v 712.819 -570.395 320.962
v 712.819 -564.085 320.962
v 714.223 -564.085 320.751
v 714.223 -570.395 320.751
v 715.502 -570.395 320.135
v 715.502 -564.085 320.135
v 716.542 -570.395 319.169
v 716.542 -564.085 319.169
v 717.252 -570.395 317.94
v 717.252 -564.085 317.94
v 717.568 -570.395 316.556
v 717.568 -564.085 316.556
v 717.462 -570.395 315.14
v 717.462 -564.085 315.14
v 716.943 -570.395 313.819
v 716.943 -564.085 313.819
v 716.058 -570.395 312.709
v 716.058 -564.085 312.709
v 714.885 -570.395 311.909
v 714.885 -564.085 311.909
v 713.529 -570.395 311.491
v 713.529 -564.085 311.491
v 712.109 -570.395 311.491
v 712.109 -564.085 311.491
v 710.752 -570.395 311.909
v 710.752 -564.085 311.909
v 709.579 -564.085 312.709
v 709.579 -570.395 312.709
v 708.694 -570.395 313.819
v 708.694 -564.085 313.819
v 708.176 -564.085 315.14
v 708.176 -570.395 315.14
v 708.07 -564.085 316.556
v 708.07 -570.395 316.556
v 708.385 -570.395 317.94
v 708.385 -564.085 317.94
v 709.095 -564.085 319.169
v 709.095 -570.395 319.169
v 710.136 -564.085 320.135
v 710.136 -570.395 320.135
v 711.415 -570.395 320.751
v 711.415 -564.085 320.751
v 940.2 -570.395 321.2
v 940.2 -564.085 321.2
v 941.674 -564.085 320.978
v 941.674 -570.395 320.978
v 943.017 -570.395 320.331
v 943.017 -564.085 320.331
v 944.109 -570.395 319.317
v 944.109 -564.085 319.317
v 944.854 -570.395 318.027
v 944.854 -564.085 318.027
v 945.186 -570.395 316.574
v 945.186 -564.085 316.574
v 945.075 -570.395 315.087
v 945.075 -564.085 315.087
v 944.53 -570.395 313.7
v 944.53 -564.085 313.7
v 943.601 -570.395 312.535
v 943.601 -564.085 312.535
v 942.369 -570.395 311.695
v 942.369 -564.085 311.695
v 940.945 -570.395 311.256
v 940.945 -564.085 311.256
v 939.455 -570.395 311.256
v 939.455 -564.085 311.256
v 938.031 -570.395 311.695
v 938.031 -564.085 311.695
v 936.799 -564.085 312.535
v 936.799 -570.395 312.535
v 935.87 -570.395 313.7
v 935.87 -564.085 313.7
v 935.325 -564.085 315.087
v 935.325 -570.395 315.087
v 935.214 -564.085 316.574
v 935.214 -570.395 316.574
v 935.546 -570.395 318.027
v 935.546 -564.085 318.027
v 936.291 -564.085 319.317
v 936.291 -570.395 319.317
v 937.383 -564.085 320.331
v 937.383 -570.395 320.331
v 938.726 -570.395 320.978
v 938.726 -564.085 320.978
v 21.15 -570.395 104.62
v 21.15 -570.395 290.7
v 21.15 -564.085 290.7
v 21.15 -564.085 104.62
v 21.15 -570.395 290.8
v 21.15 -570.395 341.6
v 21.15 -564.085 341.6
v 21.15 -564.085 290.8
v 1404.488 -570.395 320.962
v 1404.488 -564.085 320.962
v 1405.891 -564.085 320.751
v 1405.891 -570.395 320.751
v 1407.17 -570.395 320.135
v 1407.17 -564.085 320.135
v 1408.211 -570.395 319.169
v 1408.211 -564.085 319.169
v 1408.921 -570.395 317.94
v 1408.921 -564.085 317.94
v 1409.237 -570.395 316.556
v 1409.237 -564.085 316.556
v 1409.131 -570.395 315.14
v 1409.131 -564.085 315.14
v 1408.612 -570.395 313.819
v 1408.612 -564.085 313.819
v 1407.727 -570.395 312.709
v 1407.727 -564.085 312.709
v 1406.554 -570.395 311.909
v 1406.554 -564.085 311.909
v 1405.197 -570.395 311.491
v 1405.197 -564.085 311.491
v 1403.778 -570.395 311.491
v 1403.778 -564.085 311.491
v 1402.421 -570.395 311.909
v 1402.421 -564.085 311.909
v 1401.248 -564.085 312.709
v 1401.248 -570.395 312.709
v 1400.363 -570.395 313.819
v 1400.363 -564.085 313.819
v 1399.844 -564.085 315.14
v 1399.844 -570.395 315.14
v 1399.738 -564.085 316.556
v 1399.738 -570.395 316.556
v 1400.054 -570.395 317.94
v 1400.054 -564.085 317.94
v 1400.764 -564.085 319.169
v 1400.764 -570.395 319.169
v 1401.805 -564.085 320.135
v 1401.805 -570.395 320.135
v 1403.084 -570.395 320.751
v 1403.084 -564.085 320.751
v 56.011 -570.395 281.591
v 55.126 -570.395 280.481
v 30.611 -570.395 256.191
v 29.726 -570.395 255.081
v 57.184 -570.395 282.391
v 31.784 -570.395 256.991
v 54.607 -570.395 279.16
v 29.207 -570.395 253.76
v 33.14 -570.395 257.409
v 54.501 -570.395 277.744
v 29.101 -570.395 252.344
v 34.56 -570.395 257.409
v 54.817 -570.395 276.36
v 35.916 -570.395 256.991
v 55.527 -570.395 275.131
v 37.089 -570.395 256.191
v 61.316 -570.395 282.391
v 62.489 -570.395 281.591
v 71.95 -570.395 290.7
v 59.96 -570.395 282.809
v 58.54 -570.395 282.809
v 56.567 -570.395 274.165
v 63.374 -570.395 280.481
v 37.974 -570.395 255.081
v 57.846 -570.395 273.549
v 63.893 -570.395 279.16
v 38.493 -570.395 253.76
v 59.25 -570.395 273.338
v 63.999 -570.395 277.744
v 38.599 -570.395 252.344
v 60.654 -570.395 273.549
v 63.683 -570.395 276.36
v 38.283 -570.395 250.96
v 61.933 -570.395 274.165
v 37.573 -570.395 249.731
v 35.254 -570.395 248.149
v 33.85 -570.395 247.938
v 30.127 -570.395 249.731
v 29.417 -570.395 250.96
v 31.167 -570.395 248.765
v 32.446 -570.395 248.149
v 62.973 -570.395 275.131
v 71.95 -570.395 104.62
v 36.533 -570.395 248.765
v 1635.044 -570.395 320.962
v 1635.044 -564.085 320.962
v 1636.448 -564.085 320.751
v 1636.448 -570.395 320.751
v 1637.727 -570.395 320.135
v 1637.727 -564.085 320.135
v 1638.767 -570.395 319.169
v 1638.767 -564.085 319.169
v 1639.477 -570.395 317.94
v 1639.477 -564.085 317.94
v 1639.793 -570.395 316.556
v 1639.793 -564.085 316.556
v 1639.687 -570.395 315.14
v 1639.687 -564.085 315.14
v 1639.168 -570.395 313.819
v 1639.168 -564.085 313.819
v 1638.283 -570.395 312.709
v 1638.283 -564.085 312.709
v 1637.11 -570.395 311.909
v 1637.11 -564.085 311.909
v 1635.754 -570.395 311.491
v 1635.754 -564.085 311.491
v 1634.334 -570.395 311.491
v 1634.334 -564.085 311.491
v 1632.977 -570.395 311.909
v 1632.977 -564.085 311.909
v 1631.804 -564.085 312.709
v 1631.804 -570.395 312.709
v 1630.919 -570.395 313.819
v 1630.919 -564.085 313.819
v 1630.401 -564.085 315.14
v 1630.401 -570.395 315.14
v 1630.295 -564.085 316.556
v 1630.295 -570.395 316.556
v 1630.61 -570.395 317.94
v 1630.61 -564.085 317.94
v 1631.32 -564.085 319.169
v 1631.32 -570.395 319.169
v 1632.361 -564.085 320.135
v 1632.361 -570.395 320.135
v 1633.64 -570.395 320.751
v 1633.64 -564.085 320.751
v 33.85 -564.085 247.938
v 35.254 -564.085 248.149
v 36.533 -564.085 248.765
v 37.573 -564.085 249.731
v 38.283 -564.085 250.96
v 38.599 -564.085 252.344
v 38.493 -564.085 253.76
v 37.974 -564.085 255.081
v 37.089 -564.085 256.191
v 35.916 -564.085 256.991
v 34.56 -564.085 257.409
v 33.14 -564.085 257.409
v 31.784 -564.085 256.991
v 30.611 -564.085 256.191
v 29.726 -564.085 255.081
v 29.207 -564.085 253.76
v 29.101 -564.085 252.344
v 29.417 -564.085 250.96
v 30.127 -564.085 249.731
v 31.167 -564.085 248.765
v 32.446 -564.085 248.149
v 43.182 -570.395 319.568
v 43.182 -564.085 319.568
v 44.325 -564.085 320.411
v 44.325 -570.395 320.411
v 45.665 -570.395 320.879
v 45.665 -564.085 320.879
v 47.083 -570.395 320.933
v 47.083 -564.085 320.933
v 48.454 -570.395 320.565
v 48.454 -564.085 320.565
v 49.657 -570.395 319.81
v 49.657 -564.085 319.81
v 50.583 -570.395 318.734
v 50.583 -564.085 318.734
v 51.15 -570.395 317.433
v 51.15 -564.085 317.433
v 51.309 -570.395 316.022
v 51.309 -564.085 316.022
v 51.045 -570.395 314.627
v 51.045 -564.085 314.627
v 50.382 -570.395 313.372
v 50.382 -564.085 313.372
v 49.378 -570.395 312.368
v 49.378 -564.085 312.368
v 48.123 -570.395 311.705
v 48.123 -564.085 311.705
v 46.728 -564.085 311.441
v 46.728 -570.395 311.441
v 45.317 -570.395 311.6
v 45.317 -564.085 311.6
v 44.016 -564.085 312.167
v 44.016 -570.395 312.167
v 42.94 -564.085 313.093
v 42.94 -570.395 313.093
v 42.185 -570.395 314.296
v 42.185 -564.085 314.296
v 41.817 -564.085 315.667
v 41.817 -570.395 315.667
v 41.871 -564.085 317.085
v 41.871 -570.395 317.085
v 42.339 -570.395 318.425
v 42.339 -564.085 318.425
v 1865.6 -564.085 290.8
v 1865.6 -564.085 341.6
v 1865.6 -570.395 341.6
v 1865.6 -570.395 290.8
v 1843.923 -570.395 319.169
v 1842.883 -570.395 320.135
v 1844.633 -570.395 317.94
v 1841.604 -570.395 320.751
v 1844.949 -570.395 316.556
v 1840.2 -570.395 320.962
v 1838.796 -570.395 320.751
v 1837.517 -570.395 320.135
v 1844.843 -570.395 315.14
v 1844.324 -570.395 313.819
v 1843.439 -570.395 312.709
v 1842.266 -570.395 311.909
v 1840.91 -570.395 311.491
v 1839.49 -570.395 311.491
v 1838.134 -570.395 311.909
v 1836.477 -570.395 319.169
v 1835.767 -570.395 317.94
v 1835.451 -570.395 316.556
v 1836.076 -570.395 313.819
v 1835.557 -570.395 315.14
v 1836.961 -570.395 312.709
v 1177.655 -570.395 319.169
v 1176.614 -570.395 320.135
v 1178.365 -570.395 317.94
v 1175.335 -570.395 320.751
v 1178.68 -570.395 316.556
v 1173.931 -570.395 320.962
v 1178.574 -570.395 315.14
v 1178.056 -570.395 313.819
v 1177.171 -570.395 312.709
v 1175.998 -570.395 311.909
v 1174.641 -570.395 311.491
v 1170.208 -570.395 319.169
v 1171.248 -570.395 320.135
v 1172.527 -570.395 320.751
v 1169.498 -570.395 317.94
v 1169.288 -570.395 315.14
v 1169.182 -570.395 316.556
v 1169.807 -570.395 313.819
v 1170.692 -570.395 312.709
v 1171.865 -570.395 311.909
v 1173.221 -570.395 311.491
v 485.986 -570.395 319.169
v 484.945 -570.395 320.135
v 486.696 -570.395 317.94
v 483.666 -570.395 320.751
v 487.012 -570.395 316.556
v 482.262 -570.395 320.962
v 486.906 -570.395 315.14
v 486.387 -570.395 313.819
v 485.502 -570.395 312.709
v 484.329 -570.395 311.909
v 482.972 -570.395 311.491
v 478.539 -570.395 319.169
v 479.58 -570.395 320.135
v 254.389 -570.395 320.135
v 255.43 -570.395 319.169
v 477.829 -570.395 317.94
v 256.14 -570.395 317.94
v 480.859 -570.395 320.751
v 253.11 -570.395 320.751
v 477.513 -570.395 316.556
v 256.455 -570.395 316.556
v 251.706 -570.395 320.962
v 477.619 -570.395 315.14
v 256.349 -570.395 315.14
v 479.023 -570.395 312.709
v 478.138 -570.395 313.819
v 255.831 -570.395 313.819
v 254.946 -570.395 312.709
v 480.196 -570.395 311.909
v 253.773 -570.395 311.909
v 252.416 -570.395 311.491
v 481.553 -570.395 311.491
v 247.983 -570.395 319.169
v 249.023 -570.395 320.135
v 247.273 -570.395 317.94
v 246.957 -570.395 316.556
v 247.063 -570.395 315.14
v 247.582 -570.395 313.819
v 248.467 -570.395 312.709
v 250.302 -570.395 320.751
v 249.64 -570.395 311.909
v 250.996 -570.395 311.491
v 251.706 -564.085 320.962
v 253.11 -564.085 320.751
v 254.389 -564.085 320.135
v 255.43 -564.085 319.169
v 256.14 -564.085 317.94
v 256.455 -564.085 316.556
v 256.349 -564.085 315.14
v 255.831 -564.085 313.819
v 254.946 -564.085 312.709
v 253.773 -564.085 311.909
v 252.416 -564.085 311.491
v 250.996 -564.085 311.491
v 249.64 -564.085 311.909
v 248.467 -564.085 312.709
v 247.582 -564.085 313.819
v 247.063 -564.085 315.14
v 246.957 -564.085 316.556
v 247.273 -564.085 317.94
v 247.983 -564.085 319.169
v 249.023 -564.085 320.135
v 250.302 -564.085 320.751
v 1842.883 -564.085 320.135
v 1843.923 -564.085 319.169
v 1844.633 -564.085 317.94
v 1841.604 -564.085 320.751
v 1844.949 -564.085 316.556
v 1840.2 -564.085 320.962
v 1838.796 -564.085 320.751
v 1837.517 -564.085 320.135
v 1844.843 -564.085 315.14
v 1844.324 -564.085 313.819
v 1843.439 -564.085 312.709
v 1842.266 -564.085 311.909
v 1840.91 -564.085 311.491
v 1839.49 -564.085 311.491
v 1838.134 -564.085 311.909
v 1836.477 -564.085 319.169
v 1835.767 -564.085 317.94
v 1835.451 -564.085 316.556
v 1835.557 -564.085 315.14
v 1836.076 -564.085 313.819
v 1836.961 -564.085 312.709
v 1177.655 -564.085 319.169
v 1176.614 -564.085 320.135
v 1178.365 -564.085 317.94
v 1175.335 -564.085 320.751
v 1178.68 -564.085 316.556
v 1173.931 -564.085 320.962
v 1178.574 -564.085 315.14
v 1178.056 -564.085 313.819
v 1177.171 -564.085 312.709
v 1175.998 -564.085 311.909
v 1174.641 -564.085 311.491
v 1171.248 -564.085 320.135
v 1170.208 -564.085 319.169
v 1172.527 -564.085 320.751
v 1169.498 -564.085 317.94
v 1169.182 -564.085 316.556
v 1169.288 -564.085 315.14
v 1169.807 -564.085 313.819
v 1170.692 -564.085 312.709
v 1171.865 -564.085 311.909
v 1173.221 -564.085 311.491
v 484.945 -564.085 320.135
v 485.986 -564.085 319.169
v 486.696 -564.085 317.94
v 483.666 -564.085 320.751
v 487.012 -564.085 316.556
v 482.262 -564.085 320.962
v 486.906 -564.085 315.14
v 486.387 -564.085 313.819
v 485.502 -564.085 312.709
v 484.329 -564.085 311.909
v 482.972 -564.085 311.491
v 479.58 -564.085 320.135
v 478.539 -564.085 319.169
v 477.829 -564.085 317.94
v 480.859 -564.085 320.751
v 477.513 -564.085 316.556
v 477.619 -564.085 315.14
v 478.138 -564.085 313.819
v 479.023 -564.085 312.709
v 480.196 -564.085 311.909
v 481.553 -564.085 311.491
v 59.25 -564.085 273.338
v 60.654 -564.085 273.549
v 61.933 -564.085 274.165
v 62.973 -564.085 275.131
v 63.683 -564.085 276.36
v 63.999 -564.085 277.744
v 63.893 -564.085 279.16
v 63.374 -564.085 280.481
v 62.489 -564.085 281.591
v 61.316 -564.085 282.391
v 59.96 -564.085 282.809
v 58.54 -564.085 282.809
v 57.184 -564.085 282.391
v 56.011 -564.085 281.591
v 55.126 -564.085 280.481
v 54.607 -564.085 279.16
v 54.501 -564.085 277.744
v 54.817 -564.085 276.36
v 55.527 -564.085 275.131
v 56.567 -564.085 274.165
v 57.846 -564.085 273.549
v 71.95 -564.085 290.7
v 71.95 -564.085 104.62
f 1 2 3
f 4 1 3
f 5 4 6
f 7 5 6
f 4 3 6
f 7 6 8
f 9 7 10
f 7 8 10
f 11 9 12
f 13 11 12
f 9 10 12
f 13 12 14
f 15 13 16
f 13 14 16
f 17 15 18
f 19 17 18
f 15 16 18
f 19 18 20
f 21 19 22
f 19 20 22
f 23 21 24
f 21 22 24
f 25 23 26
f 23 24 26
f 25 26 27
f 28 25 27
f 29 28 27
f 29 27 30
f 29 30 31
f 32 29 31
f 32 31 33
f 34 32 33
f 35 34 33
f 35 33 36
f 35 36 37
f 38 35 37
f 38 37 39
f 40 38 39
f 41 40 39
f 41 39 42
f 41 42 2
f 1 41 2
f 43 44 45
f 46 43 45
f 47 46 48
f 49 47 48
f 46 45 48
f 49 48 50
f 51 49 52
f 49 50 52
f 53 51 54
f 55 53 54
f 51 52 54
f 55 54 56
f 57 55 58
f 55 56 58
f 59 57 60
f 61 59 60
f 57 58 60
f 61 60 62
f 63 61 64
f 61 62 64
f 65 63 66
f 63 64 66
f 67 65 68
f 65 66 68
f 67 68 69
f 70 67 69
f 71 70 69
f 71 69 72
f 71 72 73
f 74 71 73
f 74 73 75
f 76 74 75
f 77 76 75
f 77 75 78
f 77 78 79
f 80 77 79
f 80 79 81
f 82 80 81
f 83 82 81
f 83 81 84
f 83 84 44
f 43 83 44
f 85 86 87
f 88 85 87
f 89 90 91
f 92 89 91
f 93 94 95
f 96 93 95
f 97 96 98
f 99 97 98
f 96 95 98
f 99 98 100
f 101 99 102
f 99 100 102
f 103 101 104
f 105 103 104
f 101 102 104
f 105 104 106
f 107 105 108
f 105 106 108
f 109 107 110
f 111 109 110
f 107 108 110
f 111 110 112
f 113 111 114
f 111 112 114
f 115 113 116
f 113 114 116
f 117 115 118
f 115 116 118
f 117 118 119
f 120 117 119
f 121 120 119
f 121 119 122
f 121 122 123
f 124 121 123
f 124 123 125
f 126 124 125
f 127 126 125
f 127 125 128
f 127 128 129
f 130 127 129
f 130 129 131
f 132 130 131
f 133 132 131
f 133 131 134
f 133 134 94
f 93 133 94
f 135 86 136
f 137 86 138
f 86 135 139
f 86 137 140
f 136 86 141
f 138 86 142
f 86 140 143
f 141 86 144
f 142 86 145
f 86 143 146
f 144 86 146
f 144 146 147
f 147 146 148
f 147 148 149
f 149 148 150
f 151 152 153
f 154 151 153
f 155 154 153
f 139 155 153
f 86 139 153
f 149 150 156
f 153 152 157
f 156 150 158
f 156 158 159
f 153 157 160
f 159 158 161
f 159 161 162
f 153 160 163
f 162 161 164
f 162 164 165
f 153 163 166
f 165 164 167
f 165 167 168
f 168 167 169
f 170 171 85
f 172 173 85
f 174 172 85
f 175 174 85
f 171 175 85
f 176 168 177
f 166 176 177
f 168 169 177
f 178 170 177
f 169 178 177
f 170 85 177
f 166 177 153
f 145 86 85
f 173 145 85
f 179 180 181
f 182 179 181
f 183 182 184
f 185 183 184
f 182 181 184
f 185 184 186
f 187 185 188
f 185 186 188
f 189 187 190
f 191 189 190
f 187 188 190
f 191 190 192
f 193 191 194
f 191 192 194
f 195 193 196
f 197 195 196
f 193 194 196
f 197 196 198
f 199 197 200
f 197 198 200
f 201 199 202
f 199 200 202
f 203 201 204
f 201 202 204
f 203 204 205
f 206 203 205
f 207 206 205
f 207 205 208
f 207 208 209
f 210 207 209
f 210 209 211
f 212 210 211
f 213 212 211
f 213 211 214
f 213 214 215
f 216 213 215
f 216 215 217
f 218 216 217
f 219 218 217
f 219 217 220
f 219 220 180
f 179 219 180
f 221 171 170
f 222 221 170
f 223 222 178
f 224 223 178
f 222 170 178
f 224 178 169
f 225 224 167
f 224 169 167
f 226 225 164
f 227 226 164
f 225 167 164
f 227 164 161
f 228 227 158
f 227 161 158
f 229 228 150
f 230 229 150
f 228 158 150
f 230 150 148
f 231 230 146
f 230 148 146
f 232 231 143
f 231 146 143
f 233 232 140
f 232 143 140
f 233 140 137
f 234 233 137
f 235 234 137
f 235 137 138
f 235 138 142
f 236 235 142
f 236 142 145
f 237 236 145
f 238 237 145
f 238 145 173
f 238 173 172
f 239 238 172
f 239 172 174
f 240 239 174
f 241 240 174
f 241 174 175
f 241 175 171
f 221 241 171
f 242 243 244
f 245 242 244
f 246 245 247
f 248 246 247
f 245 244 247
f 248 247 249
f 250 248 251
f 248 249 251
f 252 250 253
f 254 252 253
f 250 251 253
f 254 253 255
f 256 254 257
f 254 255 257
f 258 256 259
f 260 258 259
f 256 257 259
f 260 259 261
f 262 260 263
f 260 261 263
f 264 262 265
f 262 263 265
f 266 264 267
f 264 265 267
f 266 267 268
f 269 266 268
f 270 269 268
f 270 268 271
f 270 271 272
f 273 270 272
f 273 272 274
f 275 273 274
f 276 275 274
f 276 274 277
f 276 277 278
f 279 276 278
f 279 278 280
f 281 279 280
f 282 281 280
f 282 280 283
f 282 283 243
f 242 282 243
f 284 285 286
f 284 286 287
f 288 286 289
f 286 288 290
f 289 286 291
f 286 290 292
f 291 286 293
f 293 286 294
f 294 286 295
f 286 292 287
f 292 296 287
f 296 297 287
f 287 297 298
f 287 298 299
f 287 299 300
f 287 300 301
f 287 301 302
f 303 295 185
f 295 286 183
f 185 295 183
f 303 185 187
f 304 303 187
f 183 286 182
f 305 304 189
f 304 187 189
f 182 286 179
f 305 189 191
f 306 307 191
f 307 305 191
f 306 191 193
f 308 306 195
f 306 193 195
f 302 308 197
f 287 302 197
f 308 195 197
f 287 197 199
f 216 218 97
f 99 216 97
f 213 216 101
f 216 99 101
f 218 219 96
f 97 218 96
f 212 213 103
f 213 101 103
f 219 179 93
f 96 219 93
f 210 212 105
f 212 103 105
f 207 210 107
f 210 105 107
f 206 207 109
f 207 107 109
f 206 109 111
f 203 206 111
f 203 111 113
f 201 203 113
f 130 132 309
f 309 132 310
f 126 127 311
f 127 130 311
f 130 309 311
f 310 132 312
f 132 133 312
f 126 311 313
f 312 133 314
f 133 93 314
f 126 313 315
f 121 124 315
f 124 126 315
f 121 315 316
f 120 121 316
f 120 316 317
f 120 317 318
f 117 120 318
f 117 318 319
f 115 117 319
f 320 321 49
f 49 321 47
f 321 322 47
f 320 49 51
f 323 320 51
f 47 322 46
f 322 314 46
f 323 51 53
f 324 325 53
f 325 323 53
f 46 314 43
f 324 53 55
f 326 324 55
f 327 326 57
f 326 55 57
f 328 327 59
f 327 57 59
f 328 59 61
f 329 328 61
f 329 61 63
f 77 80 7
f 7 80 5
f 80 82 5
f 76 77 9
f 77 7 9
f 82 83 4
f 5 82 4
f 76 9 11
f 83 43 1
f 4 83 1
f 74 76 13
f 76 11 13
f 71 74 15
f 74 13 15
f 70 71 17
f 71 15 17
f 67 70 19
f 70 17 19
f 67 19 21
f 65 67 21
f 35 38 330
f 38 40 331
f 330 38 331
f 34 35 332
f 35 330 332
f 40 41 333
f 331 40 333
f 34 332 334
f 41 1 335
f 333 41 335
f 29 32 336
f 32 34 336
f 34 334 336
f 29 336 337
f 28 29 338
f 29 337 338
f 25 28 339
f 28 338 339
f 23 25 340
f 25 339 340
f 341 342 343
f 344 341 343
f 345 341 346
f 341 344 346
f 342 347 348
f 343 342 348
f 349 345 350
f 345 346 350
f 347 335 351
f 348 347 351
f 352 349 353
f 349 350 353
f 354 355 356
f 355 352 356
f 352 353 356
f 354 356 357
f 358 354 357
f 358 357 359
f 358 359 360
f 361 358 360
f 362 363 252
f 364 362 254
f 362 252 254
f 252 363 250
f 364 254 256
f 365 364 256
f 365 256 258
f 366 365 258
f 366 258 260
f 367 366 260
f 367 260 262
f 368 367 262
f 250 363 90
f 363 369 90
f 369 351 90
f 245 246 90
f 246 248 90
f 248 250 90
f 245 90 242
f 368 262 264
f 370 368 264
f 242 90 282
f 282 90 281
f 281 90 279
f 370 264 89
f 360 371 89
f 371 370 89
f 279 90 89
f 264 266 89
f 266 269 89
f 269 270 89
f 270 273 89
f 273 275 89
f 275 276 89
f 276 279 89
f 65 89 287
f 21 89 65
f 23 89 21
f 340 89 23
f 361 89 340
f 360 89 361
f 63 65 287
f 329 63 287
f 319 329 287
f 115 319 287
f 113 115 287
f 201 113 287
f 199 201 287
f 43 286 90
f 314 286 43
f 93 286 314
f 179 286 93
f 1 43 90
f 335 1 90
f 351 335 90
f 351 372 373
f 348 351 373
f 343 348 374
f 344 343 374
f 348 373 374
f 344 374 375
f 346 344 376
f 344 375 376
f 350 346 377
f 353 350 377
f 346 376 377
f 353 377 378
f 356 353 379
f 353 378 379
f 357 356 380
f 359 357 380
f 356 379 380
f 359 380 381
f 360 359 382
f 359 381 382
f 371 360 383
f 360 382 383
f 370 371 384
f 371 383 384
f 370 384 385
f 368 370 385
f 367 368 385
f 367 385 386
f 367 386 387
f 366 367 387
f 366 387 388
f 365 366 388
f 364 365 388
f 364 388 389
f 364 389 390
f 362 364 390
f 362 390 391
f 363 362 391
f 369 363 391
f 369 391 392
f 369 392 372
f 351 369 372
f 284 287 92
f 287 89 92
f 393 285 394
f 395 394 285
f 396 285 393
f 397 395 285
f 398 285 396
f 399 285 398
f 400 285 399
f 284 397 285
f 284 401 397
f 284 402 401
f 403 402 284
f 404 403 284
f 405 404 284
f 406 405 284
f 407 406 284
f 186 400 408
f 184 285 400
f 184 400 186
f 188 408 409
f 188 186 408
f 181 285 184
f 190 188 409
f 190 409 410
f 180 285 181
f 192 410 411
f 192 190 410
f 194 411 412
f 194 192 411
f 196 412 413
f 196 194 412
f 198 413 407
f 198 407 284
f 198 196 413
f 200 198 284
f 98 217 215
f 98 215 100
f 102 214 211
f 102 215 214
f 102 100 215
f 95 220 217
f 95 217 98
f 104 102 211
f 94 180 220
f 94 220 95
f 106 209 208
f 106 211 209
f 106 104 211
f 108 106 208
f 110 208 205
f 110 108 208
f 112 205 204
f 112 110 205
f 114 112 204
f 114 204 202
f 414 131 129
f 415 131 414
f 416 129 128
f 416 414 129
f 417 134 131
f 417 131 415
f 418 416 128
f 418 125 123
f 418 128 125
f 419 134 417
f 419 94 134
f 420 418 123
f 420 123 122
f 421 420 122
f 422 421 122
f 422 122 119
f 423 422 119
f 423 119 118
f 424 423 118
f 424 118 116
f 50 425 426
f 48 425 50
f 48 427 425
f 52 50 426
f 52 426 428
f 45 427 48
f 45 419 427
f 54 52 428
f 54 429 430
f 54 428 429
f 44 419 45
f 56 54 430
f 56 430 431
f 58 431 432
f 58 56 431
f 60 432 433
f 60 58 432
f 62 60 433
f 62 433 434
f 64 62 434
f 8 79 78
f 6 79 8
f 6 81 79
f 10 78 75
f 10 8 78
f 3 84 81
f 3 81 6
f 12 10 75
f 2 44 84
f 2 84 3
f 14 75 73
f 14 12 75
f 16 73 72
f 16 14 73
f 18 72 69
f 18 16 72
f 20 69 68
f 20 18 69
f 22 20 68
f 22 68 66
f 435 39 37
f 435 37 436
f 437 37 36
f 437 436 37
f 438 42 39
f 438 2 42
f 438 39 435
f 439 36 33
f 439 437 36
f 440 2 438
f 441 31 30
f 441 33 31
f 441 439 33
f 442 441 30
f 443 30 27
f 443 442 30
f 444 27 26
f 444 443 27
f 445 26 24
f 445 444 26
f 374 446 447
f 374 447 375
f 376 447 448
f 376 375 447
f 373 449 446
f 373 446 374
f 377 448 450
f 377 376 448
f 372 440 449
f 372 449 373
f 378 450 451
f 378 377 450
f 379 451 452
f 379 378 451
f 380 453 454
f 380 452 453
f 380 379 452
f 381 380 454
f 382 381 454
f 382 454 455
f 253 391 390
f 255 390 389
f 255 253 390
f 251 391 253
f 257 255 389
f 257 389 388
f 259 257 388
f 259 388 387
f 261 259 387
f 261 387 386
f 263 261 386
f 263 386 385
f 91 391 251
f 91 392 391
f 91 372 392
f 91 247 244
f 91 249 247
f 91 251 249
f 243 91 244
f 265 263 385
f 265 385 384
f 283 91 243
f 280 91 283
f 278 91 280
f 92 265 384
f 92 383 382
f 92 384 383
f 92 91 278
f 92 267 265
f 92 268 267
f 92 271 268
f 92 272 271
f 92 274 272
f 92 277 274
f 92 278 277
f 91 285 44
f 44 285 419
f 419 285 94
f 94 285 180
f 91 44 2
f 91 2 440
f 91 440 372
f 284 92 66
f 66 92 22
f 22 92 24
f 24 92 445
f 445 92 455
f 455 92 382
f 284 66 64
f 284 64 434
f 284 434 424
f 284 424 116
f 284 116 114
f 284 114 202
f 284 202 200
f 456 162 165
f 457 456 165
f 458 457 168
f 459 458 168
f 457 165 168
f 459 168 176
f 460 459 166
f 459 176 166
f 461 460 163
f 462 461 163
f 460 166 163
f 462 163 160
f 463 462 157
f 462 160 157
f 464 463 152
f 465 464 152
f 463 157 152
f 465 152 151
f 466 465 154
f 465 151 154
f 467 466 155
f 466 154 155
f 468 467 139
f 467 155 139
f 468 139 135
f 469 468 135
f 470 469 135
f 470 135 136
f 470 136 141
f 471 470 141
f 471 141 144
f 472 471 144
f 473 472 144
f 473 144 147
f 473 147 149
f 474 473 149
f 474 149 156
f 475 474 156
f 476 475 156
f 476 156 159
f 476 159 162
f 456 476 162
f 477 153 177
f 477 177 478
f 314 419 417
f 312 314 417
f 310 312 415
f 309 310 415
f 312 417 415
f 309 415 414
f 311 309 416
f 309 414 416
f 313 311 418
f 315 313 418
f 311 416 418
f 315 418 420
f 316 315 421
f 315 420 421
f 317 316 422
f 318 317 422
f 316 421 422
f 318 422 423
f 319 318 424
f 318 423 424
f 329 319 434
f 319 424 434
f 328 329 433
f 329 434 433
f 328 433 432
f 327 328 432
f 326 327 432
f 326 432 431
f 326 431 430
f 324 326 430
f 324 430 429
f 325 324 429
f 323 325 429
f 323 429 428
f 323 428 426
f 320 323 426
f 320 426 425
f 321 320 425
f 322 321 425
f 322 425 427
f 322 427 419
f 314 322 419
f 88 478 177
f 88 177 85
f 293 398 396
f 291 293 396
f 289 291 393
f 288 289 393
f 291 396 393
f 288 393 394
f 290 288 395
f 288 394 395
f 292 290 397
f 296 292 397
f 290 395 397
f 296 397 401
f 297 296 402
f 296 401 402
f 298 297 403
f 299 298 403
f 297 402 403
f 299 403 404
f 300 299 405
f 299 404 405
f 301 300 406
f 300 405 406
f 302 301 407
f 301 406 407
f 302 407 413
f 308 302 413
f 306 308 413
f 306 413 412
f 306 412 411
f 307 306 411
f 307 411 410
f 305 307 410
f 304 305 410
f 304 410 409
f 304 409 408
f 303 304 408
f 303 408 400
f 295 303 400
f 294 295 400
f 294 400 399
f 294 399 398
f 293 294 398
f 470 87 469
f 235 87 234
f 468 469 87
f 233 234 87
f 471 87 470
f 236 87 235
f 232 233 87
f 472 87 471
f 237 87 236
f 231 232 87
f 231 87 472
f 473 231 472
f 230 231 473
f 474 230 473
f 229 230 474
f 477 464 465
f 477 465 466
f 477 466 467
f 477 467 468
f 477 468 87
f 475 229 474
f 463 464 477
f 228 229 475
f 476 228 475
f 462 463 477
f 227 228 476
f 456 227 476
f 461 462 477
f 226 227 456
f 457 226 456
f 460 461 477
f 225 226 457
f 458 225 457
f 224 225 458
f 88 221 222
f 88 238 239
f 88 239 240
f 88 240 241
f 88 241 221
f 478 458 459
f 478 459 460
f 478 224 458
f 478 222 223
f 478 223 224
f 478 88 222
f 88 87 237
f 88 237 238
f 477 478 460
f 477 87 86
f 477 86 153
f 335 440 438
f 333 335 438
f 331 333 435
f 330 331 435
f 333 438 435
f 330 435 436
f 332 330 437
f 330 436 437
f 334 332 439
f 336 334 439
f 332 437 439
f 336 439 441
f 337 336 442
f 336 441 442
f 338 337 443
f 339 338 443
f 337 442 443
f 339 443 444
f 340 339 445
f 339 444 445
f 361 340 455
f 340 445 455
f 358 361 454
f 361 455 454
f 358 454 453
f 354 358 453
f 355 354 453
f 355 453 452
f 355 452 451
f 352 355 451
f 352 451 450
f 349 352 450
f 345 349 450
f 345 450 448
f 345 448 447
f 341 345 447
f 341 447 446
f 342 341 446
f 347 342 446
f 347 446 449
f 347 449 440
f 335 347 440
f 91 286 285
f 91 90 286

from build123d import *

# Parameters (mm, degrees)
CROQUIS2_W               = 50.8
CROQUIS2_H               = 6.31
CROQUIS3_W               = 50.8
CROQUIS3_H               = 6.31
CROQUIS4_W               = 60
CROQUIS4_H               = 53.155
SALIENTE_EXTRUIR1_DEPTH  = 6.31
CROQUIS5_W               = 60
CROQUIS5_H               = 6.31
CORTAR_EXTRUIR1_DEPTH    = 6.31
CORTAR_EXTRUIR2_DEPTH    = 502
CROQUIS8_W               = 50.8
CROQUIS8_H               = 564.085
CORTAR_EXTRUIR3_DEPTH    = 502
CROQUIS9_W               = 314.3
CROQUIS9_H               = 1090.402933
CORTAR_EXTRUIR4_DEPTH    = 502
CROQUIS10_W              = 50.8
CROQUIS10_H              = 6.31
CORTAR_EXTRUIR5_DEPTH    = 95
CORTAR_EXTRUIR6_DEPTH    = 95
CROQUIS13_W              = 120
CROQUIS13_H              = 249.755
CORTAR_EXTRUIR7_DEPTH    = 95
CROQUIS16_W              = 125
CROQUIS16_H              = 50.8
SALIENTE_EXTRUIR4_DEPTH  = 6.31
CROQUIS17_W              = 50.8
CROQUIS17_H              = 6.31
SALIENTE_EXTRUIR5_DEPTH  = 50.8
SALIENTE_EXTRUIR6_DEPTH  = 50.8
CROQUIS21_W              = 10
CROQUIS21_H              = 50.8
CORTAR_EXTRUIR9_DEPTH    = 53
CROQUIS22_W              = 0.1
CROQUIS22_H              = 50.8
CORTAR_EXTRUIR10_DEPTH   = 10
CORTAR_EXTRUIR11_DEPTH   = 237
CROQUIS24_W              = 50.8
CROQUIS24_H              = 204.986160176
CORTAR_EXTRUIR12_DEPTH   = 237
CROQUIS25_W              = 50.8
CROQUIS25_H              = 6.31
SALIENTE_EXTRUIR7_DEPTH  = 1.1
CROQUIS26_W              = 50.8
CROQUIS26_H              = 6.31
SALIENTE_EXTRUIR8_DEPTH  = 12.7
CROQUIS27_R              = 5
CORTAR_EXTRUIR13_DEPTH   = 10
CROQUIS28_W              = 0.1
CROQUIS28_H              = 50.8
SALIENTE_EXTRUIR9_DEPTH  = 6.31
CROQUIS29_W              = 50.8
CROQUIS29_H              = 0.1
CORTAR_EXTRUIR14_DEPTH   = 50
CROQUIS30_W              = 50.8
CROQUIS30_H              = 6.31
SALIENTE_EXTRUIR10_DEPTH = 50.8
CROQUIS31_R              = 4.7625
CORTAR_EXTRUIR15_DEPTH   = 10
CROQUIS32_R              = 4.7625
CORTAR_EXTRUIR16_DEPTH   = 33
CROQUIS33_R              = 4.7625
CORTAR_EXTRUIR17_DEPTH   = 50
CROQUIS34_R              = 4.7625
CORTAR_EXTRUIR18_DEPTH   = 82


with BuildPart() as part:
    # Barrer1: sweep along a curve in space
    with BuildLine() as barrer1_path:
        Line((0, 0, 0), (0, -567.24, 0))
        Line((0, -567.24, 0), (0, -567.24, 316.2))
        Line((0, -567.24, 316.2), (1786.7, -567.24, 316.2))
        Line((1786.7, -567.24, 316.2), (1786.7, -567.24, 578))
        Line((1786.7, -567.24, 578), (1786.7, -435.47278313, 578))
        Line((1786.7, -435.47278313, 578), (1786.7, -435.47278313, 1432.002933))
    # Croquis2 → Barrer1 (sweep)
    with BuildSketch(Plane(origin=(0, 0, 0), x_dir=(1, 0, 0), z_dir=(0, 1, 0))):
        Rectangle(CROQUIS2_W, CROQUIS2_H)
        with Locations((263.5, 0)):
            Rectangle(CROQUIS2_W, CROQUIS2_H)
    sweep(path=barrer1_path.line, transition=Transition.RIGHT)

    # Barrer4: sweep along a curve in space
    with BuildLine() as barrer4_path:
        Line((-0.201028049, -3.155, -3.155), (-0.201028049, -3.155, -207.155))
        Line((-0.201028049, -3.155, -207.155), (-0.201028049, -53.155, -207.155))
    # Croquis3 → Barrer4 (sweep)
    with BuildSketch(Plane(origin=(0, 0, -3.155), x_dir=(-1, 0, 0), z_dir=(0, 0, -1))):
        with Locations((-263.5, -3.155)):
            Rectangle(CROQUIS3_W, CROQUIS3_H)
        with Locations((0, -3.155)):
            Rectangle(CROQUIS3_W, CROQUIS3_H)
    sweep(path=barrer4_path.line, transition=Transition.RIGHT)

    # Croquis4 → Saliente-Extruir1 (add)
    with BuildSketch(Plane(origin=(0, 0, -210.31), x_dir=(-1, 0, 0), z_dir=(0, 0, -1))):
        with Locations((-208.1, -26.5775)):
            Rectangle(CROQUIS4_W, CROQUIS4_H)
    extrude(amount=-SALIENTE_EXTRUIR1_DEPTH)

    # Croquis5 → Cortar-Extruir1 (cut)
    with BuildSketch(Plane.XY.offset(-204)):
        with Locations((208.1, -3.155)):
            Rectangle(CROQUIS5_W, CROQUIS5_H)
    extrude(amount=-CORTAR_EXTRUIR1_DEPTH, mode=Mode.SUBTRACT)

    # Croquis7 → Cortar-Extruir2 (cut)
    with BuildSketch(Plane.XY.offset(3.155)):
        Polygon((288.9, -564.085), (238.1, -564.085), (238.1, -68.875540851), (170.611072112, -68.875540851), (170.611072112, 0), (288.9, 0), align=None)
    extrude(amount=-CORTAR_EXTRUIR2_DEPTH, mode=Mode.SUBTRACT)

    # Croquis8 → Cortar-Extruir3 (cut)
    with BuildSketch(Plane.XY.offset(3.155)):
        with Locations((0, -282.0425)):
            Rectangle(CROQUIS8_W, CROQUIS8_H)
    extrude(amount=-CORTAR_EXTRUIR3_DEPTH, mode=Mode.SUBTRACT)

    # Croquis9 → Cortar-Extruir4 (cut)
    with BuildSketch(Plane(origin=(0, -432.31778313, 0), x_dir=(1, 0, 0), z_dir=(0, 1, 0))):
        with Locations((1918.45, -886.8014665)):
            Rectangle(CROQUIS9_W, CROQUIS9_H)
    extrude(amount=-CORTAR_EXTRUIR4_DEPTH, mode=Mode.SUBTRACT)

    # Croquis10 → Cortar-Extruir5 (cut)
    with BuildSketch(Plane(origin=(0, 0, -3.155), x_dir=(-1, 0, 0), z_dir=(0, 0, -1))):
        with Locations((0, -567.24)):
            Rectangle(CROQUIS10_W, CROQUIS10_H)
    extrude(amount=-CORTAR_EXTRUIR5_DEPTH, mode=Mode.SUBTRACT)

    # Croquis11 → Cortar-Extruir6 (cut)
    with BuildSketch(Plane(origin=(0, -564.085, 0), x_dir=(1, 0, 0), z_dir=(0, 1, 0))):
        Polygon((238.1, -78.1), (288.9, -78.1), (288.9, -27.3), align=None)
        Polygon((238.1, -78.1), (288.9, -27.3), (238.1, -27.3), align=None)
        Polygon((238.1, -27.3), (288.9, -27.3), (288.9, -3.155), (288.9, 3.155), (238.1, 3.155), (238.1, -3.155), align=None)
    extrude(amount=-CORTAR_EXTRUIR6_DEPTH, mode=Mode.SUBTRACT)

    # Croquis13 → Cortar-Extruir7 (cut)
    with BuildSketch(Plane(origin=(0, -564.085, 0), x_dir=(1, 0, 0), z_dir=(0, 1, 0))):
        with Locations((34.6, -216.7225)):
            Rectangle(CROQUIS13_W, CROQUIS13_H)
    extrude(amount=-CORTAR_EXTRUIR7_DEPTH, mode=Mode.SUBTRACT)

    # Croquis16 → Saliente-Extruir4 (add)
    with BuildSketch(Plane(origin=(0, -564.085, 0), x_dir=(1, 0, 0), z_dir=(0, 1, 0))):
        with Locations((226.4, -52.7)):
            Rectangle(CROQUIS16_W, CROQUIS16_H)
    extrude(amount=-SALIENTE_EXTRUIR4_DEPTH)

    # Barrer5: sweep along a curve in space
    with BuildLine() as barrer5_path:
        Line((94.6, -567.24, 316.2), (46.55, -567.24, 316.2))
        Line((46.55, -567.24, 316.2), (46.55, -567.24, 105.72))
    # Croquis17 → Barrer5 (sweep)
    with BuildSketch(Plane.ZY.offset(-94.6)):
        with Locations((316.2, -567.24)):
            Rectangle(CROQUIS17_W, CROQUIS17_H)
    sweep(path=barrer5_path.line, transition=Transition.RIGHT)

    # Croquis20 → Saliente-Extruir6 (add)
    with BuildSketch(Plane.ZY.offset(-163.9)):
        Polygon((78.1, -564.085), (78.1, -439.884522326), (59.966060883, -387.925515276), (54.008468178, -390.004743297), (71.79, -440.954001003), (71.79, -564.085), align=None)
    extrude(amount=-SALIENTE_EXTRUIR6_DEPTH)

    # Croquis21 → Cortar-Extruir9 (cut)
    with BuildSketch(Plane(origin=(0, -564.085, 0), x_dir=(1, 0, 0), z_dir=(0, 1, 0))):
        with Locations((1807.1, -316.2)):
            Rectangle(CROQUIS21_W, CROQUIS21_H)
    extrude(amount=-CORTAR_EXTRUIR9_DEPTH, mode=Mode.SUBTRACT)

    # Croquis22 → Cortar-Extruir10 (cut)
    with BuildSketch(Plane(origin=(0, -564.085, 0), x_dir=(1, 0, 0), z_dir=(0, 1, 0))):
        with Locations((72, -316.2)):
            Rectangle(CROQUIS22_W, CROQUIS22_H)
    extrude(amount=-CORTAR_EXTRUIR10_DEPTH, mode=Mode.SUBTRACT)

    # Croquis23 → Cortar-Extruir11 (cut)
    with BuildSketch(Plane.XZ.offset(570.395)):
        Polygon((2024.8, 341.6), (2024.8, 78.1), (163.9, 78.1), (163.9, 0), (2111.300371304, 0), (2111.300371304, 341.6), align=None)
    extrude(amount=-CORTAR_EXTRUIR11_DEPTH, mode=Mode.SUBTRACT)

    # Croquis25 → Saliente-Extruir7 (add)
    with BuildSketch(Plane(origin=(0, 0, 105.72), x_dir=(-1, 0, 0), z_dir=(0, 0, -1))):
        with Locations((-46.55, -567.24)):
            Rectangle(CROQUIS25_W, CROQUIS25_H)
    extrude(amount=SALIENTE_EXTRUIR7_DEPTH)

    # Croquis26 → Saliente-Extruir8 (add)
    with BuildSketch(Plane(origin=(1802.1, 0, 0), x_dir=(0, 0, -1), z_dir=(1, 0, 0))):
        with Locations((-316.2, -567.24)):
            Rectangle(CROQUIS26_W, CROQUIS26_H)
    extrude(amount=SALIENTE_EXTRUIR8_DEPTH)

    # Croquis27 → Cortar-Extruir13 (cut)
    with BuildSketch(Plane(origin=(0, -564.085, 0), x_dir=(1, 0, 0), z_dir=(0, 1, 0))):
        with Locations(Location((940.200000079, -316.2, 0), (0, 0, 270))):
            Circle(CROQUIS27_R)
    extrude(amount=-CORTAR_EXTRUIR13_DEPTH, mode=Mode.SUBTRACT)

    # Croquis28 → Saliente-Extruir9 (add)
    with BuildSketch(Plane(origin=(0, -564.085, 0), x_dir=(1, 0, 0), z_dir=(0, 1, 0))):
        with Locations((72, -316.2)):
            Rectangle(CROQUIS28_W, CROQUIS28_H)
    extrude(amount=-SALIENTE_EXTRUIR9_DEPTH)

    # Croquis29 → Cortar-Extruir14 (cut)
    with BuildSketch(Plane(origin=(0, -564.085, 0), x_dir=(1, 0, 0), z_dir=(0, 1, 0))):
        with Locations((46.55, -290.75)):
            Rectangle(CROQUIS29_W, CROQUIS29_H)
    extrude(amount=-CORTAR_EXTRUIR14_DEPTH, mode=Mode.SUBTRACT)


with BuildPart() as body_2:
    # Croquis18 → Saliente-Extruir5 (new body)
    with BuildSketch(Plane.ZY.offset(-21.15)):
        Polygon((98.787204793, -564.085), (98.787204793, -435.522965931), (64.969988324, -367.622744457), (59.321737777, -370.435814978), (91.897545374, -435.843461779), (91.842933, -564.085), align=None)
    extrude(amount=-SALIENTE_EXTRUIR5_DEPTH)

    # Croquis24 → Cortar-Extruir12 (cut)
    with BuildSketch(Plane.XY.offset(98.787204793)):
        with Locations((46.55, -461.591919912)):
            Rectangle(CROQUIS24_W, CROQUIS24_H)
    extrude(amount=-CORTAR_EXTRUIR12_DEPTH, mode=Mode.SUBTRACT)


with BuildPart() as cortar_extruir14_piece_1:
    # of the separate pieces the step leaves, piece 1, a body of its own (cortar_extruir14_pieces)
    add(part.part.solids().sort_by_distance((1814.8, -570.395, 341.6))[0])

    # Croquis30 → Saliente-Extruir10 (add)
    with BuildSketch(Plane(origin=(1814.8, 0, 0), x_dir=(0, 0, -1), z_dir=(1, 0, 0))):
        with Locations((-316.2, -567.24)):
            Rectangle(CROQUIS30_W, CROQUIS30_H)
    extrude(amount=SALIENTE_EXTRUIR10_DEPTH)

    # Croquis31 → Cortar-Extruir15 (cut)
    with BuildSketch(Plane(origin=(0, -564.085, 0), x_dir=(1, 0, 0), z_dir=(0, 1, 0))):
        with Locations(Location((1840.2, -316.2, 0), (0, 0, 270))):
            Circle(CROQUIS31_R)
    extrude(amount=-CORTAR_EXTRUIR15_DEPTH, mode=Mode.SUBTRACT)

    # Croquis32 → Cortar-Extruir16 (cut)
    with BuildSketch(Plane(origin=(0, -564.085, 0), x_dir=(1, 0, 0), z_dir=(0, 1, 0))):
        with Locations(Location((46.55, -316.2, 0), (0, 0, 225))):
            Circle(CROQUIS32_R)
    extrude(amount=-CORTAR_EXTRUIR16_DEPTH, mode=Mode.SUBTRACT)

    # Croquis34 → Cortar-Extruir18 (cut)
    with BuildSketch(Plane(origin=(0, -564.085, 0), x_dir=(1, 0, 0), z_dir=(0, 1, 0))):
        with Locations(Location((1635.04375, -316.2, 0), (0, 0, 270))):
            Circle(CROQUIS34_R)
        with Locations(Location((1404.4875, -316.2, 0), (0, 0, 270))):
            Circle(CROQUIS34_R)
        with Locations(Location((1173.93125, -316.2, 0), (0, 0, 270))):
            Circle(CROQUIS34_R)
        with Locations(Location((712.81875, -316.2, 0), (0, 0, 270))):
            Circle(CROQUIS34_R)
        with Locations(Location((482.2625, -316.2, 0), (0, 0, 270))):
            Circle(CROQUIS34_R)
        with Locations(Location((251.70625, -316.2, 0), (0, 0, 270))):
            Circle(CROQUIS34_R)
    extrude(amount=-CORTAR_EXTRUIR18_DEPTH, mode=Mode.SUBTRACT)


with BuildPart() as cortar_extruir14_piece_2:
    # of the separate pieces the step leaves, piece 2, a body of its own (cortar_extruir14_pieces)
    add(part.part.solids().sort_by_distance((21.15, -570.395, 290.7))[0])

    # Croquis33 → Cortar-Extruir17 (cut)
    with BuildSketch(Plane(origin=(0, -570.395, 0), x_dir=(-1, 0, 0), z_dir=(0, -1, 0))):
        with Locations(Location((-33.85, -252.7, 0), (0, 0, 90))):
            Circle(CROQUIS33_R)
        with Locations(Location((-59.25, -278.1, 0), (0, 0, 90))):
            Circle(CROQUIS33_R)
    extrude(amount=-CORTAR_EXTRUIR17_DEPTH, mode=Mode.SUBTRACT)


solid = Compound([cortar_extruir14_piece_1.part, cortar_extruir14_piece_2.part])
